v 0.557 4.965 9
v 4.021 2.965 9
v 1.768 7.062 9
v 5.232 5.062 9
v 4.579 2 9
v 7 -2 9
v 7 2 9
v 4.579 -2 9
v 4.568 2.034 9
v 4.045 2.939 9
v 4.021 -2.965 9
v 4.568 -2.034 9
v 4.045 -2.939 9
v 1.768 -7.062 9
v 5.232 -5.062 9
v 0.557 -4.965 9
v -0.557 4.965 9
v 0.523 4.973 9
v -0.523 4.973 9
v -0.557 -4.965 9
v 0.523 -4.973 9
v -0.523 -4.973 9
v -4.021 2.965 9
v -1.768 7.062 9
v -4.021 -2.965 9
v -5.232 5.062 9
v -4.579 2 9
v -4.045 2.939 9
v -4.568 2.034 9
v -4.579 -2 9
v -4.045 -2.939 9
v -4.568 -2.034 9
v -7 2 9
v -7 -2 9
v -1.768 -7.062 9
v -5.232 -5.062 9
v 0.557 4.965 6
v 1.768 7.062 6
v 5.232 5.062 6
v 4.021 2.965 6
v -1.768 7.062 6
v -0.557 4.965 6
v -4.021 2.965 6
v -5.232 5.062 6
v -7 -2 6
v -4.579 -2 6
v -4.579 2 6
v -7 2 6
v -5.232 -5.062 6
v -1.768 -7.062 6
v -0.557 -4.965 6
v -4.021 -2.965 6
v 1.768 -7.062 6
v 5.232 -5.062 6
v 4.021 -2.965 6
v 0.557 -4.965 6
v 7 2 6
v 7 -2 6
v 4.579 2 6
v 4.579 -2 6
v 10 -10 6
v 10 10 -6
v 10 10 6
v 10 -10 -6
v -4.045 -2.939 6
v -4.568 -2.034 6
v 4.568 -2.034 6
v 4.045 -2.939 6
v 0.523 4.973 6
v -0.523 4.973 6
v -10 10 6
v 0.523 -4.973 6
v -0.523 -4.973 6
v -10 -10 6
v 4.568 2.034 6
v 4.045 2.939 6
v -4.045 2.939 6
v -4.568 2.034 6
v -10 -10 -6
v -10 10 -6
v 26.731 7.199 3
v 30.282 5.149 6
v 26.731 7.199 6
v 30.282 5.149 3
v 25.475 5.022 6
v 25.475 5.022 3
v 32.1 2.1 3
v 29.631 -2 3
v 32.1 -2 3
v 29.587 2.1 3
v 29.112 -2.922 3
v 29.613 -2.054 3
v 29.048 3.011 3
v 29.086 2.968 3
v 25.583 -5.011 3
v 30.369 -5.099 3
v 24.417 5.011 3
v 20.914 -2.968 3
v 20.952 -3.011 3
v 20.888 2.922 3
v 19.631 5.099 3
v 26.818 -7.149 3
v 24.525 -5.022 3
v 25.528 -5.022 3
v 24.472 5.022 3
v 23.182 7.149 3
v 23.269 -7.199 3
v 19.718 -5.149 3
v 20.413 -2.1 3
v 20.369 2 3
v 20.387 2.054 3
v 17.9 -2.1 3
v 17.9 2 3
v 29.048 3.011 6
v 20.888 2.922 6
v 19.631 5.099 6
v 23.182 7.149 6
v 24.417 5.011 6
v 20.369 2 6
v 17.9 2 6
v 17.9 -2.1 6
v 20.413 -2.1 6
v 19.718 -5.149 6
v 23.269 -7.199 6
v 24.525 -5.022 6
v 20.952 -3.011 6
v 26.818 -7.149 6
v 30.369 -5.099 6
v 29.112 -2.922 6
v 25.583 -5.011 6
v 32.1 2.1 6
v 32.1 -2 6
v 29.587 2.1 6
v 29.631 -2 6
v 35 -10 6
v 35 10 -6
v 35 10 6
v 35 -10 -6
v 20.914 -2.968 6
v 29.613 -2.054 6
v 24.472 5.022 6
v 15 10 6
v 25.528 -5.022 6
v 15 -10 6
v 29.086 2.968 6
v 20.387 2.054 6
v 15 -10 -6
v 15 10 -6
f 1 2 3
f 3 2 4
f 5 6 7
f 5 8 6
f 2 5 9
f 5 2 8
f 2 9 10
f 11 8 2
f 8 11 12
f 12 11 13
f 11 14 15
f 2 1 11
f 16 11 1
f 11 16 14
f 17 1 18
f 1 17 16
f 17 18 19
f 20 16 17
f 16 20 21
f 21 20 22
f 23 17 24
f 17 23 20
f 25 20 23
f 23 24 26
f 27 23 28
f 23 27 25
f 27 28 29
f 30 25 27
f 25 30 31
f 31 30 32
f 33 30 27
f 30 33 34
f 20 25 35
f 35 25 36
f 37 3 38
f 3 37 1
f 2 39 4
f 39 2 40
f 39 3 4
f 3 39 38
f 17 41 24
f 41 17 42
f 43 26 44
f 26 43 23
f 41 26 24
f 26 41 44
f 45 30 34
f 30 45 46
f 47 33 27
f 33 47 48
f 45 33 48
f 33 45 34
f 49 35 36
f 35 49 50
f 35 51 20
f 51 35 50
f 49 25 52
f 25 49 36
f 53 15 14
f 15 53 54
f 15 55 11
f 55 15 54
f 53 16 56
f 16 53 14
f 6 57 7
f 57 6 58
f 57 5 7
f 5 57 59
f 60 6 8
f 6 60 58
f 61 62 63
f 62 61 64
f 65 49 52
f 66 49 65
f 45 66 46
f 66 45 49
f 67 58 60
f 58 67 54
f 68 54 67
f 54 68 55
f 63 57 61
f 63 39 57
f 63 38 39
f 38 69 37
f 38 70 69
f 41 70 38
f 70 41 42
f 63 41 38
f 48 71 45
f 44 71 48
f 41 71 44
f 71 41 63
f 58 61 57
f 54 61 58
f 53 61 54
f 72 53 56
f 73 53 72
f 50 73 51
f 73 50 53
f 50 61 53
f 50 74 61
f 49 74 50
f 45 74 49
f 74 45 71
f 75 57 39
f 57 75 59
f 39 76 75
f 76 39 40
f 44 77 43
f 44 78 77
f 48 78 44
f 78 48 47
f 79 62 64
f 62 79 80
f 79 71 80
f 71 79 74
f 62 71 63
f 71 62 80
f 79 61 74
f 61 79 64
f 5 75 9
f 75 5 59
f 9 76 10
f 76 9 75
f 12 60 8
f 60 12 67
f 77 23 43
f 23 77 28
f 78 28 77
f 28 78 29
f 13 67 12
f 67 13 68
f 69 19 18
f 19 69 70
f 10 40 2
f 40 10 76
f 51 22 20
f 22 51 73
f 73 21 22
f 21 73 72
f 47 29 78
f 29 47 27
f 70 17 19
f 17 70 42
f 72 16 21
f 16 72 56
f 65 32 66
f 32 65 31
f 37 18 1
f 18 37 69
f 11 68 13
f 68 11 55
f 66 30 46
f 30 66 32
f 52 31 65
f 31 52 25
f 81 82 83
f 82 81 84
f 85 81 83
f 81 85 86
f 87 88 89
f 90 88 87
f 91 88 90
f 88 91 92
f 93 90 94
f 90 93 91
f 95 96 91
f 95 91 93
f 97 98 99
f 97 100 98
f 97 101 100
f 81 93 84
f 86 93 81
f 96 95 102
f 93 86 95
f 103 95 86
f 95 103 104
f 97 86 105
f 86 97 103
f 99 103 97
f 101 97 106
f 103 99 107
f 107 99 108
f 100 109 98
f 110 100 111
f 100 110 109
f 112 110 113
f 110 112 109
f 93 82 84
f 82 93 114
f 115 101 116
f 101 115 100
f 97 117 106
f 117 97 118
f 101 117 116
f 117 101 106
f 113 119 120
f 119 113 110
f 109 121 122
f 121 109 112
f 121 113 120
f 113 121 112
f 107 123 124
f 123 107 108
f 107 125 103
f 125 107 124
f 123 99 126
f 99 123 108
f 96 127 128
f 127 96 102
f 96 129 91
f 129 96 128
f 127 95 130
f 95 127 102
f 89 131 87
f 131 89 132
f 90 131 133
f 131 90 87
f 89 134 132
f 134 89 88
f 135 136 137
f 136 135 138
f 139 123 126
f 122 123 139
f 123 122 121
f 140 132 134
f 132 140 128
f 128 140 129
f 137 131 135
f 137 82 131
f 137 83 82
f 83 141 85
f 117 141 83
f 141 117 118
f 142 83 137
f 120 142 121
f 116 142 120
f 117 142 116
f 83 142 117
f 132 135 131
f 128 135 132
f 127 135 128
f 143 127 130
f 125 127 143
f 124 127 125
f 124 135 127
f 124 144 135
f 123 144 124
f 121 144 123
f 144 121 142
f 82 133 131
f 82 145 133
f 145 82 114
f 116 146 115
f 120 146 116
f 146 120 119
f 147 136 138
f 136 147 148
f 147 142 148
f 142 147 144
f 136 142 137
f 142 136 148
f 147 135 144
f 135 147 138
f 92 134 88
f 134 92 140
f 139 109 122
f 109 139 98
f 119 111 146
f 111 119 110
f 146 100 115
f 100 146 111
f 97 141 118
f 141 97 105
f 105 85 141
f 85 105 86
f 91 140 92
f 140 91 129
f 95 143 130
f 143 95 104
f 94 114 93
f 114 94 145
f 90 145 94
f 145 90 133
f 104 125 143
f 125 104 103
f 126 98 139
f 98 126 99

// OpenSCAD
$fn = 30;
err=0.1;
h=6;
d=10;
e=6;

w=4;
l=4;
cw=20;
cl=20;

color("DeepSkyBlue")
union(){
cube([cw,cl,h*2], center=true);
translate([0,0,h/2])
cylinder(d=d, h=h);
    for(i=[1:e]) {
        rotate(i*360/e,0,0)
        translate([d/2-2,-2,h/2])
        cube([w,l,h]);
        }
}

color("Aqua")
translate([cw+5,0,0])
difference(){
cube([cw,cl,h*2], center=true);
translate([0,0,h/2])
cylinder(d=d+err, h=h);
    for(i=[1:e]) {
        rotate(i*360/e,0,0)
        translate([d/2-2,-2,h/2])
        cube([w+err,l+err,h]);
        }
}
